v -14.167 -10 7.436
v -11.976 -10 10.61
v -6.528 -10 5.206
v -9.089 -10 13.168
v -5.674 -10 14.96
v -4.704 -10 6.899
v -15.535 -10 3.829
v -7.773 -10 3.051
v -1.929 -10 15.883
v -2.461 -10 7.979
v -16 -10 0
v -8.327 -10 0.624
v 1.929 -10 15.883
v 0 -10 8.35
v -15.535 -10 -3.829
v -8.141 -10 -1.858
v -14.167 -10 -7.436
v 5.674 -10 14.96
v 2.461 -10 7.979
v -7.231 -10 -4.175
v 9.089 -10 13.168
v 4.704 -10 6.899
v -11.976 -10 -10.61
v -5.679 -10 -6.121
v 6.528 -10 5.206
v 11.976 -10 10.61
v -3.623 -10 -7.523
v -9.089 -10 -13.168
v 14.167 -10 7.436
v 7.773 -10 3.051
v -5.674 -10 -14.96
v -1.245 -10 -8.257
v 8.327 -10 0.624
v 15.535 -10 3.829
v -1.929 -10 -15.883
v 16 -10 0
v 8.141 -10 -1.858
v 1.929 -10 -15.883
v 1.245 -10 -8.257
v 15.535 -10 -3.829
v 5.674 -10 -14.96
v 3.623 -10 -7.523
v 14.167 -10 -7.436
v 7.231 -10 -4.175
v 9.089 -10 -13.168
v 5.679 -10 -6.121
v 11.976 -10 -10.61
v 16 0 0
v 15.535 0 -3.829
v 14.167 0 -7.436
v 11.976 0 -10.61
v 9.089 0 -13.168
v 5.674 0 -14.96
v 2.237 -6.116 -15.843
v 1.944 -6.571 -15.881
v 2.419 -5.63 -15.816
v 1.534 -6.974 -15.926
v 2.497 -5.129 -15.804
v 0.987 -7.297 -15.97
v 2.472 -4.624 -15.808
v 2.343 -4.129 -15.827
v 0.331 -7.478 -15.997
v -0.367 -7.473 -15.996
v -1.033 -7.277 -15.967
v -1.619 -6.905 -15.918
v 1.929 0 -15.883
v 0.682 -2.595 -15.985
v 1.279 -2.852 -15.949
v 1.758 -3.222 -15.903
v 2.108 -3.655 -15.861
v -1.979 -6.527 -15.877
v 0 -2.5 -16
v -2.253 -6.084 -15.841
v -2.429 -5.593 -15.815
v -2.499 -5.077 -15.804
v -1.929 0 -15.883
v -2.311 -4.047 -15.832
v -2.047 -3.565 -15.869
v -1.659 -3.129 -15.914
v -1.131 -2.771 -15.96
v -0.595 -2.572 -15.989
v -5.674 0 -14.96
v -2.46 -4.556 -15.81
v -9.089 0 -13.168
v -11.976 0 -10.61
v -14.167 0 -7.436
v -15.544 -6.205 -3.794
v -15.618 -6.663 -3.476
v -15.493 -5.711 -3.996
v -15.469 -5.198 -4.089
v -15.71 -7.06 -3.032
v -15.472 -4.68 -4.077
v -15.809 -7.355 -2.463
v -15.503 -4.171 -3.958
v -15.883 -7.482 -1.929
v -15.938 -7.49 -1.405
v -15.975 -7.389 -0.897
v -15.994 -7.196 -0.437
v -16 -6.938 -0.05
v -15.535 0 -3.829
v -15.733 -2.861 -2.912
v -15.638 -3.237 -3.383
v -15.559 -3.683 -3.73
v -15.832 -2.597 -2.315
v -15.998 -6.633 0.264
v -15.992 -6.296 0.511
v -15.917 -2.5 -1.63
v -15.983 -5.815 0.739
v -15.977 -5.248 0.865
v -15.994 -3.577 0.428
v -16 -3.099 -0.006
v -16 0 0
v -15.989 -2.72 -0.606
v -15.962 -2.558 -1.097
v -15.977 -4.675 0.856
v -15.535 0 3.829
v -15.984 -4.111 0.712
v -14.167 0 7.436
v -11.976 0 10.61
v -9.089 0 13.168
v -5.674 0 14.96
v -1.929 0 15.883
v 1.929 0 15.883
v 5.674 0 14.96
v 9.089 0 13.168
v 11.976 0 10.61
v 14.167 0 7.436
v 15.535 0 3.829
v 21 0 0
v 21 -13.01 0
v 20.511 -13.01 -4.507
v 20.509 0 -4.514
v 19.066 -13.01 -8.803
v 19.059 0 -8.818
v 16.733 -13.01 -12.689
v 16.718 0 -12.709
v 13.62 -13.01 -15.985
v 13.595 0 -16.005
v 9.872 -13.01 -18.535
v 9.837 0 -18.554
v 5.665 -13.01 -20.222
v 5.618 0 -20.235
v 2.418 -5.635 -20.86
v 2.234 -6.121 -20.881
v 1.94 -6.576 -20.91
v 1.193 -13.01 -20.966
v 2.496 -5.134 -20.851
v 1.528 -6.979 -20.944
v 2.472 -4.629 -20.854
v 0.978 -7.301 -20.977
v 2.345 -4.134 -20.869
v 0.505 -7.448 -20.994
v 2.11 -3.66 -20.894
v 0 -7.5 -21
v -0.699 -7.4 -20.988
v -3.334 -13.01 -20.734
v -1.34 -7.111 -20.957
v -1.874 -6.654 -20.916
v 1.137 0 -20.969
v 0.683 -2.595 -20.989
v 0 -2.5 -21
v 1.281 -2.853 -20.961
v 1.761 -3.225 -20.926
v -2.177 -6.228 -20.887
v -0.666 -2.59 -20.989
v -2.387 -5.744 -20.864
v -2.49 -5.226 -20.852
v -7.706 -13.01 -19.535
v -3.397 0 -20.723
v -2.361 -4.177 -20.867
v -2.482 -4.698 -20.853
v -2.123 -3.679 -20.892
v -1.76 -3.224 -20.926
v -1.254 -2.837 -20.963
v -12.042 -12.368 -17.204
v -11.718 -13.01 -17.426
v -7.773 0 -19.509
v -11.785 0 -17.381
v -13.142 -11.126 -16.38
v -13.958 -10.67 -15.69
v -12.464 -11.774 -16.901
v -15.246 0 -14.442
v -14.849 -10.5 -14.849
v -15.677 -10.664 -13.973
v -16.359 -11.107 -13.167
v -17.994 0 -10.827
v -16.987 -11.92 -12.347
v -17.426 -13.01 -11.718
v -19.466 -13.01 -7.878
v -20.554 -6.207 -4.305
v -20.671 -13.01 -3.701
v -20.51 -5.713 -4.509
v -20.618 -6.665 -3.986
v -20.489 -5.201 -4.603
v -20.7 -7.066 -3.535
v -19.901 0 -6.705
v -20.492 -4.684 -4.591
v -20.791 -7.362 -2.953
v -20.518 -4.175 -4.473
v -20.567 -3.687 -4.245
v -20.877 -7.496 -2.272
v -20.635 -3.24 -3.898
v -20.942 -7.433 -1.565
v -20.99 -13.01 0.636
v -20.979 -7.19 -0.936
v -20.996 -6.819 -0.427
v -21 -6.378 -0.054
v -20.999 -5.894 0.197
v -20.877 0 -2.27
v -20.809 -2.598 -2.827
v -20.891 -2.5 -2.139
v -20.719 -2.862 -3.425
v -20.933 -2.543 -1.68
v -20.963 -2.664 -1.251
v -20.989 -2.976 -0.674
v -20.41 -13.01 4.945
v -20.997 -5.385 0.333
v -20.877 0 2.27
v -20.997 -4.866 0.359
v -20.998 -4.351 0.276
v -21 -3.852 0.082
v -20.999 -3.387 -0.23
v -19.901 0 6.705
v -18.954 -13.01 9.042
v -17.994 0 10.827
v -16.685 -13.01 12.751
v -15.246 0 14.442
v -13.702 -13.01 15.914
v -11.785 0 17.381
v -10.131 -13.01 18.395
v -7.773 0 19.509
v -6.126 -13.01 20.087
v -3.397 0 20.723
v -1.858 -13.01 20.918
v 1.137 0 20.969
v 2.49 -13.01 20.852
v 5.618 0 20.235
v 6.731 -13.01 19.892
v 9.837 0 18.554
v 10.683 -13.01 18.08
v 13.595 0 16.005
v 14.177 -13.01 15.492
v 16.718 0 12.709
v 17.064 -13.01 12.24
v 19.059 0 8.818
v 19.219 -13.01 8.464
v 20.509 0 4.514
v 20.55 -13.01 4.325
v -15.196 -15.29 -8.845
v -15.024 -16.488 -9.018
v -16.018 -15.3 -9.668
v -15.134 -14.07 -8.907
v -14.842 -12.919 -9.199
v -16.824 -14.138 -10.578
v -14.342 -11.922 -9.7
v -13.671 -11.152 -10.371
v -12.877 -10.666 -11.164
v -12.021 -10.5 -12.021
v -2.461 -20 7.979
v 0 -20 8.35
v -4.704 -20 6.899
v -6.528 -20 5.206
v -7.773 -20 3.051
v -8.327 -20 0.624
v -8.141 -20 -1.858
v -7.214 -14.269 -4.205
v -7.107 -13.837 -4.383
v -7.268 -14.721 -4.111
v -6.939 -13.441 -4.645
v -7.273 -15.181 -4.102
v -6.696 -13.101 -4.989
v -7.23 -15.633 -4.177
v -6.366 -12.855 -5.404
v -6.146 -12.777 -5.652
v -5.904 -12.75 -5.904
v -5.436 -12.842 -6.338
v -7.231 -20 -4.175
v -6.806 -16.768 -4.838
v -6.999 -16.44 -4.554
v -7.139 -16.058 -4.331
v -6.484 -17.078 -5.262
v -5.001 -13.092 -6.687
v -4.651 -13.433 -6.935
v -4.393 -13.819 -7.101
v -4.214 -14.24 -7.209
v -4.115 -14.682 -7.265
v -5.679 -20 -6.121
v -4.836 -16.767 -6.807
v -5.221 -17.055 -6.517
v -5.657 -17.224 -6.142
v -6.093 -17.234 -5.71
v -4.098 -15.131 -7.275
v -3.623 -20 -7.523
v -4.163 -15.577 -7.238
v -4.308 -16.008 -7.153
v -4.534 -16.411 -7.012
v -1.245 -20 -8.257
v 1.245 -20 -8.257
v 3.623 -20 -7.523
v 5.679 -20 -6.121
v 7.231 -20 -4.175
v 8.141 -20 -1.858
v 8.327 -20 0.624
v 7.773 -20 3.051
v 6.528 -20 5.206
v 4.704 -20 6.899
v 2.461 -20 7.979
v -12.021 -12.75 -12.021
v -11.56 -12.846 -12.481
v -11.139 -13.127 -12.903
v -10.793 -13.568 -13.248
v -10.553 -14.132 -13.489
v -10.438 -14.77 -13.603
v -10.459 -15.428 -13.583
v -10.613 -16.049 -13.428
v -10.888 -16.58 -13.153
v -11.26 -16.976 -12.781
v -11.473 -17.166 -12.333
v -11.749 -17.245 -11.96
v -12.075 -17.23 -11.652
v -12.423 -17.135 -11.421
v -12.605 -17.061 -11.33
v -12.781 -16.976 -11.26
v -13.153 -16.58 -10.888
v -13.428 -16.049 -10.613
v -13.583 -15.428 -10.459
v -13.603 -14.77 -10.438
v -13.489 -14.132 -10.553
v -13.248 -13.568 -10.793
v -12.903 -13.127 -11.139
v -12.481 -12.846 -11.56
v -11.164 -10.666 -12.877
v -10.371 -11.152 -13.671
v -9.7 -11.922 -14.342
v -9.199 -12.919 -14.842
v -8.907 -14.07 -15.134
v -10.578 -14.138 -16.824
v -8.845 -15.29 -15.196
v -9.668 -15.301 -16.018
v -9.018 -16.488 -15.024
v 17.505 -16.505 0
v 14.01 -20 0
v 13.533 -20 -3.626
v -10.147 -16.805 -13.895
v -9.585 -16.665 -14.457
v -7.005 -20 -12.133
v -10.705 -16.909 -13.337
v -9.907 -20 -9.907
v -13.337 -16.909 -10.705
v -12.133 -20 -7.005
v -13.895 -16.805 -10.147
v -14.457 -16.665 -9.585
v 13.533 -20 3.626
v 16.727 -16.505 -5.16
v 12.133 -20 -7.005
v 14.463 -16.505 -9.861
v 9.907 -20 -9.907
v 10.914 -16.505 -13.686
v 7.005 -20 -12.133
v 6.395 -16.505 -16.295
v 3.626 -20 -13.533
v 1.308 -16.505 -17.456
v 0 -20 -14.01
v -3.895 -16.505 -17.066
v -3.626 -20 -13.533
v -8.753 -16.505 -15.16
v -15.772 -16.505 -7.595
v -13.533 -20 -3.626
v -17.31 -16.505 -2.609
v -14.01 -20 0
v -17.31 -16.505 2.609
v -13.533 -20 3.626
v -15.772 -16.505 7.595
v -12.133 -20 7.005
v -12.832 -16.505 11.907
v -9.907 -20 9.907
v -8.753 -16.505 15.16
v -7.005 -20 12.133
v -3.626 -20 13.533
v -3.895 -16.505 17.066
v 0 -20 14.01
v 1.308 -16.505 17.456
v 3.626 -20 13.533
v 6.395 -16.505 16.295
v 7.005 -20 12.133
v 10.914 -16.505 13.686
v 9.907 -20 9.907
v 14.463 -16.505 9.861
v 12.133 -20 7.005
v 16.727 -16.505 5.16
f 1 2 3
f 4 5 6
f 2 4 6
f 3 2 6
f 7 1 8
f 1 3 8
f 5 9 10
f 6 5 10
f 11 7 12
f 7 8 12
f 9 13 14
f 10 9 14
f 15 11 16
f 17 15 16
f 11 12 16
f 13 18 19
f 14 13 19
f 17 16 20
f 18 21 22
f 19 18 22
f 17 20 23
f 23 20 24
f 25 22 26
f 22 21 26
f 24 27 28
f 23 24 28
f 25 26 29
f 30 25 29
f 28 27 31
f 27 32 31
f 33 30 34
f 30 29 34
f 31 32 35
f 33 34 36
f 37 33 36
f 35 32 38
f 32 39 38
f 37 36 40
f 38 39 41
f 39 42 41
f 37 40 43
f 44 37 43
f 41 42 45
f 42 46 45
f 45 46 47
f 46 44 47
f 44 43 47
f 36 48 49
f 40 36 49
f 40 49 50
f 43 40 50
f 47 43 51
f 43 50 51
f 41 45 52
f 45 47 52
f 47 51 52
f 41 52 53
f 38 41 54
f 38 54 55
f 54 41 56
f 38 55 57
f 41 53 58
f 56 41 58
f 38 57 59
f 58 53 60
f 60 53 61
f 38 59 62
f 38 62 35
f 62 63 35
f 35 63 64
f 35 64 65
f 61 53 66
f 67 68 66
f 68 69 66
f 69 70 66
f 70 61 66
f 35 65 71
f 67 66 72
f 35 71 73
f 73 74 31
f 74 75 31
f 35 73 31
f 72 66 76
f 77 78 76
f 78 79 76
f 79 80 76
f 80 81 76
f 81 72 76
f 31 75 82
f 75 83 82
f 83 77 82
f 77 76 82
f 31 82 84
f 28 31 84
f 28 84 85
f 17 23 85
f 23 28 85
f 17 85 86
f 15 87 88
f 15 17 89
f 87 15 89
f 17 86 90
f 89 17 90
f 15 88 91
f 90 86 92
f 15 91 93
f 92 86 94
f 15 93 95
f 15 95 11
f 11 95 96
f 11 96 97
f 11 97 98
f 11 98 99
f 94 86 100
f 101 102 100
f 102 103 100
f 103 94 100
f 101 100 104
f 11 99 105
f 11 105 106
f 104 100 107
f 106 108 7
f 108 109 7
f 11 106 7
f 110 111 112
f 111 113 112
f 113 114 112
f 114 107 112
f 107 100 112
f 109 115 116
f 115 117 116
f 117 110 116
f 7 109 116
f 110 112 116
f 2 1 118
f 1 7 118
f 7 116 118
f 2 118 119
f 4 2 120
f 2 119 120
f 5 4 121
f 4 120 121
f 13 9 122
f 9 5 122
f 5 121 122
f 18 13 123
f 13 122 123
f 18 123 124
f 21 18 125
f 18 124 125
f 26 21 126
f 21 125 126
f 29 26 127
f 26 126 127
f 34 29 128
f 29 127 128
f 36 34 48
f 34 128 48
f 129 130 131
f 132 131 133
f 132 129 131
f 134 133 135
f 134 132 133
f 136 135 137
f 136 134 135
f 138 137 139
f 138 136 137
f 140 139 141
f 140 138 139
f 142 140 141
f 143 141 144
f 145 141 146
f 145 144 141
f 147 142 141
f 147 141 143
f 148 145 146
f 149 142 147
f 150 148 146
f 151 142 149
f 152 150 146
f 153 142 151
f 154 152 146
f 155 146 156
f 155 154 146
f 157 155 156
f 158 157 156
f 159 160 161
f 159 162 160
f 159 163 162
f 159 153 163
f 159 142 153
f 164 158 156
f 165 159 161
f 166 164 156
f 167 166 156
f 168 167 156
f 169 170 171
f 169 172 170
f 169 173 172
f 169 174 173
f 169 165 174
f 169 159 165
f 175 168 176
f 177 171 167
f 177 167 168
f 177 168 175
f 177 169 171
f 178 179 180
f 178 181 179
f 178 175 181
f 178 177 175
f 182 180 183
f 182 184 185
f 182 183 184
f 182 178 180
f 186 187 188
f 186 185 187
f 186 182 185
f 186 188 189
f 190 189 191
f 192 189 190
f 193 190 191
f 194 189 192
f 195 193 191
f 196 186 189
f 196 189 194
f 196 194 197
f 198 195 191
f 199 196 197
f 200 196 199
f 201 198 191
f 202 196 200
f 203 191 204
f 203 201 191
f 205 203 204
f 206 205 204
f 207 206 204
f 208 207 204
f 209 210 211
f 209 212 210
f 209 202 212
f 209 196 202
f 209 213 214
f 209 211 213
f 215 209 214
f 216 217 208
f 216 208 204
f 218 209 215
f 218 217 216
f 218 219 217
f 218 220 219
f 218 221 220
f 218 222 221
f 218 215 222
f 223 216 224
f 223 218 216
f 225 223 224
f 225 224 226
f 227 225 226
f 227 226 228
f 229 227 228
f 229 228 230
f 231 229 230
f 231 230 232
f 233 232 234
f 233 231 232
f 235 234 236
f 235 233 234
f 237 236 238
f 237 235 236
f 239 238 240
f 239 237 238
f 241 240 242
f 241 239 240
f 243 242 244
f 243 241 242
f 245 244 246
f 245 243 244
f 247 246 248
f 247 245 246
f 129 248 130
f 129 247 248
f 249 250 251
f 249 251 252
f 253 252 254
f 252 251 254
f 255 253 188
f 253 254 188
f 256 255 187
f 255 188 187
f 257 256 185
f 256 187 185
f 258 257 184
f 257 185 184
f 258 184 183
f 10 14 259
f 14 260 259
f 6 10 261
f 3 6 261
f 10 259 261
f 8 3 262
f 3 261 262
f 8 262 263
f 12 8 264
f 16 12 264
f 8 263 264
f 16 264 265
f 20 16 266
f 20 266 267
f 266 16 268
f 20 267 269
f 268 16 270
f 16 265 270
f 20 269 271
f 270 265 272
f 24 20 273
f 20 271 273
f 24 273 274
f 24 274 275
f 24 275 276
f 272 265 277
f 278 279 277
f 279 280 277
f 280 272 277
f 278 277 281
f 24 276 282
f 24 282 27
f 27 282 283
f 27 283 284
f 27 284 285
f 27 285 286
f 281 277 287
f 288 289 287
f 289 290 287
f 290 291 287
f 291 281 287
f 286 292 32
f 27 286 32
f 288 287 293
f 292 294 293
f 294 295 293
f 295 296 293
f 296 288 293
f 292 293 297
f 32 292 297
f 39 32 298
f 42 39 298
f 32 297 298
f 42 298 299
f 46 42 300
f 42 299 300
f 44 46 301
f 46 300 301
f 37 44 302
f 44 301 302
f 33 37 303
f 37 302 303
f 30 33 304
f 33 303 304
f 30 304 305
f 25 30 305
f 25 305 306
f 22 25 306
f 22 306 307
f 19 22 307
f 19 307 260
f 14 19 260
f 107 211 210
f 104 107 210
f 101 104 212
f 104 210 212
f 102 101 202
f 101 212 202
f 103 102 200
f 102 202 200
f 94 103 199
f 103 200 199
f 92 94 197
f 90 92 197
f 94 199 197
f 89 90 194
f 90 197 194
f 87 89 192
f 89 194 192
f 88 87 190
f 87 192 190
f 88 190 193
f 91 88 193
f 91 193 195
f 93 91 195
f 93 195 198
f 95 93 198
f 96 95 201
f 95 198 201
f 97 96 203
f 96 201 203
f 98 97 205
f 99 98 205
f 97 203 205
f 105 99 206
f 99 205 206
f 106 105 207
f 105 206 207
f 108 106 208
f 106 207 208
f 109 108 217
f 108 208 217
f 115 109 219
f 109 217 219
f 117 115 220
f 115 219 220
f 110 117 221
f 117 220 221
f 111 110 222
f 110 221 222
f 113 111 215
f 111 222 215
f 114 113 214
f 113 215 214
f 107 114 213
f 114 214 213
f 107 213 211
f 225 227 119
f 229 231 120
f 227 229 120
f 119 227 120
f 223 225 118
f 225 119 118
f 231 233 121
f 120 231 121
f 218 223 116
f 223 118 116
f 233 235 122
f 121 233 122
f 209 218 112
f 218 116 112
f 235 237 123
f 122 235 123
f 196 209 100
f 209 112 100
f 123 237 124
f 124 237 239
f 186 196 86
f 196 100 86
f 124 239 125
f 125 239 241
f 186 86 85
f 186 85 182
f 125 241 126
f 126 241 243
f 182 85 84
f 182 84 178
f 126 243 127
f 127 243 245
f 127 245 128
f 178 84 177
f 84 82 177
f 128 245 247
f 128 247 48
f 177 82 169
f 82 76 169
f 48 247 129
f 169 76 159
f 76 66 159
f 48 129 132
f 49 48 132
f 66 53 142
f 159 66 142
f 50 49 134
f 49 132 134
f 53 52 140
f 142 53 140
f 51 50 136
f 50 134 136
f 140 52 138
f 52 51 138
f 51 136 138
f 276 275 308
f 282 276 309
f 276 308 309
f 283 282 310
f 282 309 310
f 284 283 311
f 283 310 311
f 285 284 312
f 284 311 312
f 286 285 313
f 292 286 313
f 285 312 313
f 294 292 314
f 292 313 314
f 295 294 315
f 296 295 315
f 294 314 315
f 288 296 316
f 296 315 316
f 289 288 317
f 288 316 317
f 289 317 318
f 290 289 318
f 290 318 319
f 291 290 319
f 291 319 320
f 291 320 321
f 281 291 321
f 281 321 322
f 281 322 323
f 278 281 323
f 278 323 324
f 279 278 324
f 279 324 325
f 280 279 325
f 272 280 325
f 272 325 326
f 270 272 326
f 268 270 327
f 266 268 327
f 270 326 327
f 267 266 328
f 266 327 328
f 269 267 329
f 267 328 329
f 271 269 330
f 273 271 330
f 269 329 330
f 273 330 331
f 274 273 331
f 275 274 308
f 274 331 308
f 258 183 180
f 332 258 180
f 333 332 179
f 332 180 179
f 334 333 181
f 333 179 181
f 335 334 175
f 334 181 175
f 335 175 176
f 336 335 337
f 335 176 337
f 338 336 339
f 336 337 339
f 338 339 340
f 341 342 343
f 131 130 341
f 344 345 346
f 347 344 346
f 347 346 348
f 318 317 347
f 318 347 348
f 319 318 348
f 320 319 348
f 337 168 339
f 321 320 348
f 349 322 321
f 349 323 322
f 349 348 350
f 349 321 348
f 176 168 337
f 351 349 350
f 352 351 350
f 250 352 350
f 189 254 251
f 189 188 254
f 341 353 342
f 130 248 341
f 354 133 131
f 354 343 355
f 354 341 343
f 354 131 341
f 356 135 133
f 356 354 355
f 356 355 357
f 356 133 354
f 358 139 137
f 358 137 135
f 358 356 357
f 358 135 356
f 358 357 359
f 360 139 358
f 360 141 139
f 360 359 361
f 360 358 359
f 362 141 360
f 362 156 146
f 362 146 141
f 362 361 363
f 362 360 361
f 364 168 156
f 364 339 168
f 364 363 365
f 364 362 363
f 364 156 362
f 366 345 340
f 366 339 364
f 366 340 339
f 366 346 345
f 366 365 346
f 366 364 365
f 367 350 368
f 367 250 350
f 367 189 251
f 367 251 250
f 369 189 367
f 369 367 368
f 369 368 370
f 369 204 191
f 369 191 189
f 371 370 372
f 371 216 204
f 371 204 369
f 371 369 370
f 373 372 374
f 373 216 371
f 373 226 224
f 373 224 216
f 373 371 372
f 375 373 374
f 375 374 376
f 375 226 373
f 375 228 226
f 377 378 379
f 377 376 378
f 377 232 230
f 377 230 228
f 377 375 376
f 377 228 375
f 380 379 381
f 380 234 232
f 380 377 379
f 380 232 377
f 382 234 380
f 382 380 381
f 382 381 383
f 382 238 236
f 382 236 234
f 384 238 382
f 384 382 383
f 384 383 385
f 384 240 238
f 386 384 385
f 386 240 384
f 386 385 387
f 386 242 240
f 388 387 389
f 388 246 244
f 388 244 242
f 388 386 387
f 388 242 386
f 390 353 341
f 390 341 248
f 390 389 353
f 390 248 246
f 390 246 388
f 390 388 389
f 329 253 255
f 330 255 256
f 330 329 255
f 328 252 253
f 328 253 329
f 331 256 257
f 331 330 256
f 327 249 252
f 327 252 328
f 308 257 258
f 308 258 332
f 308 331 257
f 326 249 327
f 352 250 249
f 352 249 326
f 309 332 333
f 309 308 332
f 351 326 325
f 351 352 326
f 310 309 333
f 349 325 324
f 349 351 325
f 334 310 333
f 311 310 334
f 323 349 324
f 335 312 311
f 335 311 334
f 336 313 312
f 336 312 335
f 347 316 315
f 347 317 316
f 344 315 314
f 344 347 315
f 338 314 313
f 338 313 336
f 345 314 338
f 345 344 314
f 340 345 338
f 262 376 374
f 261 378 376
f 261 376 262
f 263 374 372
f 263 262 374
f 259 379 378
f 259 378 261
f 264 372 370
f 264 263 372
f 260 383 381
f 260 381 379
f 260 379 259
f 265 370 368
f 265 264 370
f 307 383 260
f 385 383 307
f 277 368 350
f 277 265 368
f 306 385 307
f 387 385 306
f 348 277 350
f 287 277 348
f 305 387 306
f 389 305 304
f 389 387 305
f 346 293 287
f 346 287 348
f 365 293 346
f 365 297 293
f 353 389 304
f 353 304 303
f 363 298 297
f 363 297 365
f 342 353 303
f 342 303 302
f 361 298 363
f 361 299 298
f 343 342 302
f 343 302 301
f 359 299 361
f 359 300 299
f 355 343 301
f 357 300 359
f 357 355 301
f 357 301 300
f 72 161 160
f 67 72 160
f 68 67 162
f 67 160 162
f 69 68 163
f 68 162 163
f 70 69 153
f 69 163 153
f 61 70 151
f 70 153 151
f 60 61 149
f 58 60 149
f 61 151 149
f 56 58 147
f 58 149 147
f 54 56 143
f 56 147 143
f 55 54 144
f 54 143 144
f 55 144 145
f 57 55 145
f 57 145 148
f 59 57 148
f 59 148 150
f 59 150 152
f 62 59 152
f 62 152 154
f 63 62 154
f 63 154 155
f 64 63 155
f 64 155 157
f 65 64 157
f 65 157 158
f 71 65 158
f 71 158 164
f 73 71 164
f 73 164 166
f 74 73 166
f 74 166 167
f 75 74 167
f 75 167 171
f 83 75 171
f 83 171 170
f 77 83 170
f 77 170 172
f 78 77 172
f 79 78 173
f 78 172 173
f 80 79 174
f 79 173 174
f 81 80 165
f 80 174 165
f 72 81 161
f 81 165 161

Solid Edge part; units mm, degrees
sketch "Sketch1" plane through (0, 0, 0) normal (0, -1, 0) x (1, 0, 0)
  circle A0 centre (0, 0) radius 21
extrude "Protrusion1" add sketch "Sketch1" along normal blind 20
sketch "Sketch2" plane through (0, 0, 0) normal (0, -1, 0) x (1, 0, 0)
  circle A0 centre (0, 0) radius 8
extrude "ExtrudedCutout_1" cut sketch "Sketch2" along normal blind 161.3
sketch "Sketch3" plane through (0, 0, 0) normal (0, -1, 0) x (1, 0, 0)
  circle A0 centre (0, 0) radius 16
  circle A1 centre (0, 0) radius 8
  dimension "D1" = 16
  dimension "D2" = 32
  dimension "D3" = 42
extrude "ExtrudedCutout_2" cut sketch "Sketch3" along normal blind 10
sketch "Sketch4" plane through (0, -10, -21) normal (0, 0, -1) x (0, 1, 0)
  circle A0 centre (5, 0) radius 2.5
extrude "Cutout1" cut sketch "Sketch4" against normal up to vertex (21 mm away)
pattern_circular "Pattern1" count 2 over 84.153 about axis through (-0.000024, 0, 0) along (0, 1, 0) of "Cutout1"
sketch "Sketch5" plane through (0, -20, 0) normal (0, -1, 0) x (0, 0, 1)
  circle A0 centre (0, 0) radius 8.35
extrude "Cutout2" cut sketch "Sketch5" against normal blind 63.3
sketch "Sketch6" plane through (-14.849242, -10, -14.849242) normal (-0.7071068, 0, -0.7071068) x (0, 1, 0)
  circle A0 centre (-5, 0) radius 2.25
extrude "ExtrudedCutout_9" cut sketch "Sketch6" against normal blind 20.6
sketch "Sketch7" plane through (-14.849242, -10, -14.849242) normal (-0.7071068, 0, -0.7071068) x (0, 1, 0)
  circle A0 centre (-5, 0) radius 2.25
  circle A1 centre (-5, 0) radius 4.5
  dimension "D1" = 5
  dimension "D2" = 4.5
  dimension "D3" = 9
extrude "ExtrudedCutout_10" cut sketch "Sketch7" against normal blind 4
chamfer "Chamfer_4" distance 6.98968 angle 45 1 edges at (-21, -20, 0)
